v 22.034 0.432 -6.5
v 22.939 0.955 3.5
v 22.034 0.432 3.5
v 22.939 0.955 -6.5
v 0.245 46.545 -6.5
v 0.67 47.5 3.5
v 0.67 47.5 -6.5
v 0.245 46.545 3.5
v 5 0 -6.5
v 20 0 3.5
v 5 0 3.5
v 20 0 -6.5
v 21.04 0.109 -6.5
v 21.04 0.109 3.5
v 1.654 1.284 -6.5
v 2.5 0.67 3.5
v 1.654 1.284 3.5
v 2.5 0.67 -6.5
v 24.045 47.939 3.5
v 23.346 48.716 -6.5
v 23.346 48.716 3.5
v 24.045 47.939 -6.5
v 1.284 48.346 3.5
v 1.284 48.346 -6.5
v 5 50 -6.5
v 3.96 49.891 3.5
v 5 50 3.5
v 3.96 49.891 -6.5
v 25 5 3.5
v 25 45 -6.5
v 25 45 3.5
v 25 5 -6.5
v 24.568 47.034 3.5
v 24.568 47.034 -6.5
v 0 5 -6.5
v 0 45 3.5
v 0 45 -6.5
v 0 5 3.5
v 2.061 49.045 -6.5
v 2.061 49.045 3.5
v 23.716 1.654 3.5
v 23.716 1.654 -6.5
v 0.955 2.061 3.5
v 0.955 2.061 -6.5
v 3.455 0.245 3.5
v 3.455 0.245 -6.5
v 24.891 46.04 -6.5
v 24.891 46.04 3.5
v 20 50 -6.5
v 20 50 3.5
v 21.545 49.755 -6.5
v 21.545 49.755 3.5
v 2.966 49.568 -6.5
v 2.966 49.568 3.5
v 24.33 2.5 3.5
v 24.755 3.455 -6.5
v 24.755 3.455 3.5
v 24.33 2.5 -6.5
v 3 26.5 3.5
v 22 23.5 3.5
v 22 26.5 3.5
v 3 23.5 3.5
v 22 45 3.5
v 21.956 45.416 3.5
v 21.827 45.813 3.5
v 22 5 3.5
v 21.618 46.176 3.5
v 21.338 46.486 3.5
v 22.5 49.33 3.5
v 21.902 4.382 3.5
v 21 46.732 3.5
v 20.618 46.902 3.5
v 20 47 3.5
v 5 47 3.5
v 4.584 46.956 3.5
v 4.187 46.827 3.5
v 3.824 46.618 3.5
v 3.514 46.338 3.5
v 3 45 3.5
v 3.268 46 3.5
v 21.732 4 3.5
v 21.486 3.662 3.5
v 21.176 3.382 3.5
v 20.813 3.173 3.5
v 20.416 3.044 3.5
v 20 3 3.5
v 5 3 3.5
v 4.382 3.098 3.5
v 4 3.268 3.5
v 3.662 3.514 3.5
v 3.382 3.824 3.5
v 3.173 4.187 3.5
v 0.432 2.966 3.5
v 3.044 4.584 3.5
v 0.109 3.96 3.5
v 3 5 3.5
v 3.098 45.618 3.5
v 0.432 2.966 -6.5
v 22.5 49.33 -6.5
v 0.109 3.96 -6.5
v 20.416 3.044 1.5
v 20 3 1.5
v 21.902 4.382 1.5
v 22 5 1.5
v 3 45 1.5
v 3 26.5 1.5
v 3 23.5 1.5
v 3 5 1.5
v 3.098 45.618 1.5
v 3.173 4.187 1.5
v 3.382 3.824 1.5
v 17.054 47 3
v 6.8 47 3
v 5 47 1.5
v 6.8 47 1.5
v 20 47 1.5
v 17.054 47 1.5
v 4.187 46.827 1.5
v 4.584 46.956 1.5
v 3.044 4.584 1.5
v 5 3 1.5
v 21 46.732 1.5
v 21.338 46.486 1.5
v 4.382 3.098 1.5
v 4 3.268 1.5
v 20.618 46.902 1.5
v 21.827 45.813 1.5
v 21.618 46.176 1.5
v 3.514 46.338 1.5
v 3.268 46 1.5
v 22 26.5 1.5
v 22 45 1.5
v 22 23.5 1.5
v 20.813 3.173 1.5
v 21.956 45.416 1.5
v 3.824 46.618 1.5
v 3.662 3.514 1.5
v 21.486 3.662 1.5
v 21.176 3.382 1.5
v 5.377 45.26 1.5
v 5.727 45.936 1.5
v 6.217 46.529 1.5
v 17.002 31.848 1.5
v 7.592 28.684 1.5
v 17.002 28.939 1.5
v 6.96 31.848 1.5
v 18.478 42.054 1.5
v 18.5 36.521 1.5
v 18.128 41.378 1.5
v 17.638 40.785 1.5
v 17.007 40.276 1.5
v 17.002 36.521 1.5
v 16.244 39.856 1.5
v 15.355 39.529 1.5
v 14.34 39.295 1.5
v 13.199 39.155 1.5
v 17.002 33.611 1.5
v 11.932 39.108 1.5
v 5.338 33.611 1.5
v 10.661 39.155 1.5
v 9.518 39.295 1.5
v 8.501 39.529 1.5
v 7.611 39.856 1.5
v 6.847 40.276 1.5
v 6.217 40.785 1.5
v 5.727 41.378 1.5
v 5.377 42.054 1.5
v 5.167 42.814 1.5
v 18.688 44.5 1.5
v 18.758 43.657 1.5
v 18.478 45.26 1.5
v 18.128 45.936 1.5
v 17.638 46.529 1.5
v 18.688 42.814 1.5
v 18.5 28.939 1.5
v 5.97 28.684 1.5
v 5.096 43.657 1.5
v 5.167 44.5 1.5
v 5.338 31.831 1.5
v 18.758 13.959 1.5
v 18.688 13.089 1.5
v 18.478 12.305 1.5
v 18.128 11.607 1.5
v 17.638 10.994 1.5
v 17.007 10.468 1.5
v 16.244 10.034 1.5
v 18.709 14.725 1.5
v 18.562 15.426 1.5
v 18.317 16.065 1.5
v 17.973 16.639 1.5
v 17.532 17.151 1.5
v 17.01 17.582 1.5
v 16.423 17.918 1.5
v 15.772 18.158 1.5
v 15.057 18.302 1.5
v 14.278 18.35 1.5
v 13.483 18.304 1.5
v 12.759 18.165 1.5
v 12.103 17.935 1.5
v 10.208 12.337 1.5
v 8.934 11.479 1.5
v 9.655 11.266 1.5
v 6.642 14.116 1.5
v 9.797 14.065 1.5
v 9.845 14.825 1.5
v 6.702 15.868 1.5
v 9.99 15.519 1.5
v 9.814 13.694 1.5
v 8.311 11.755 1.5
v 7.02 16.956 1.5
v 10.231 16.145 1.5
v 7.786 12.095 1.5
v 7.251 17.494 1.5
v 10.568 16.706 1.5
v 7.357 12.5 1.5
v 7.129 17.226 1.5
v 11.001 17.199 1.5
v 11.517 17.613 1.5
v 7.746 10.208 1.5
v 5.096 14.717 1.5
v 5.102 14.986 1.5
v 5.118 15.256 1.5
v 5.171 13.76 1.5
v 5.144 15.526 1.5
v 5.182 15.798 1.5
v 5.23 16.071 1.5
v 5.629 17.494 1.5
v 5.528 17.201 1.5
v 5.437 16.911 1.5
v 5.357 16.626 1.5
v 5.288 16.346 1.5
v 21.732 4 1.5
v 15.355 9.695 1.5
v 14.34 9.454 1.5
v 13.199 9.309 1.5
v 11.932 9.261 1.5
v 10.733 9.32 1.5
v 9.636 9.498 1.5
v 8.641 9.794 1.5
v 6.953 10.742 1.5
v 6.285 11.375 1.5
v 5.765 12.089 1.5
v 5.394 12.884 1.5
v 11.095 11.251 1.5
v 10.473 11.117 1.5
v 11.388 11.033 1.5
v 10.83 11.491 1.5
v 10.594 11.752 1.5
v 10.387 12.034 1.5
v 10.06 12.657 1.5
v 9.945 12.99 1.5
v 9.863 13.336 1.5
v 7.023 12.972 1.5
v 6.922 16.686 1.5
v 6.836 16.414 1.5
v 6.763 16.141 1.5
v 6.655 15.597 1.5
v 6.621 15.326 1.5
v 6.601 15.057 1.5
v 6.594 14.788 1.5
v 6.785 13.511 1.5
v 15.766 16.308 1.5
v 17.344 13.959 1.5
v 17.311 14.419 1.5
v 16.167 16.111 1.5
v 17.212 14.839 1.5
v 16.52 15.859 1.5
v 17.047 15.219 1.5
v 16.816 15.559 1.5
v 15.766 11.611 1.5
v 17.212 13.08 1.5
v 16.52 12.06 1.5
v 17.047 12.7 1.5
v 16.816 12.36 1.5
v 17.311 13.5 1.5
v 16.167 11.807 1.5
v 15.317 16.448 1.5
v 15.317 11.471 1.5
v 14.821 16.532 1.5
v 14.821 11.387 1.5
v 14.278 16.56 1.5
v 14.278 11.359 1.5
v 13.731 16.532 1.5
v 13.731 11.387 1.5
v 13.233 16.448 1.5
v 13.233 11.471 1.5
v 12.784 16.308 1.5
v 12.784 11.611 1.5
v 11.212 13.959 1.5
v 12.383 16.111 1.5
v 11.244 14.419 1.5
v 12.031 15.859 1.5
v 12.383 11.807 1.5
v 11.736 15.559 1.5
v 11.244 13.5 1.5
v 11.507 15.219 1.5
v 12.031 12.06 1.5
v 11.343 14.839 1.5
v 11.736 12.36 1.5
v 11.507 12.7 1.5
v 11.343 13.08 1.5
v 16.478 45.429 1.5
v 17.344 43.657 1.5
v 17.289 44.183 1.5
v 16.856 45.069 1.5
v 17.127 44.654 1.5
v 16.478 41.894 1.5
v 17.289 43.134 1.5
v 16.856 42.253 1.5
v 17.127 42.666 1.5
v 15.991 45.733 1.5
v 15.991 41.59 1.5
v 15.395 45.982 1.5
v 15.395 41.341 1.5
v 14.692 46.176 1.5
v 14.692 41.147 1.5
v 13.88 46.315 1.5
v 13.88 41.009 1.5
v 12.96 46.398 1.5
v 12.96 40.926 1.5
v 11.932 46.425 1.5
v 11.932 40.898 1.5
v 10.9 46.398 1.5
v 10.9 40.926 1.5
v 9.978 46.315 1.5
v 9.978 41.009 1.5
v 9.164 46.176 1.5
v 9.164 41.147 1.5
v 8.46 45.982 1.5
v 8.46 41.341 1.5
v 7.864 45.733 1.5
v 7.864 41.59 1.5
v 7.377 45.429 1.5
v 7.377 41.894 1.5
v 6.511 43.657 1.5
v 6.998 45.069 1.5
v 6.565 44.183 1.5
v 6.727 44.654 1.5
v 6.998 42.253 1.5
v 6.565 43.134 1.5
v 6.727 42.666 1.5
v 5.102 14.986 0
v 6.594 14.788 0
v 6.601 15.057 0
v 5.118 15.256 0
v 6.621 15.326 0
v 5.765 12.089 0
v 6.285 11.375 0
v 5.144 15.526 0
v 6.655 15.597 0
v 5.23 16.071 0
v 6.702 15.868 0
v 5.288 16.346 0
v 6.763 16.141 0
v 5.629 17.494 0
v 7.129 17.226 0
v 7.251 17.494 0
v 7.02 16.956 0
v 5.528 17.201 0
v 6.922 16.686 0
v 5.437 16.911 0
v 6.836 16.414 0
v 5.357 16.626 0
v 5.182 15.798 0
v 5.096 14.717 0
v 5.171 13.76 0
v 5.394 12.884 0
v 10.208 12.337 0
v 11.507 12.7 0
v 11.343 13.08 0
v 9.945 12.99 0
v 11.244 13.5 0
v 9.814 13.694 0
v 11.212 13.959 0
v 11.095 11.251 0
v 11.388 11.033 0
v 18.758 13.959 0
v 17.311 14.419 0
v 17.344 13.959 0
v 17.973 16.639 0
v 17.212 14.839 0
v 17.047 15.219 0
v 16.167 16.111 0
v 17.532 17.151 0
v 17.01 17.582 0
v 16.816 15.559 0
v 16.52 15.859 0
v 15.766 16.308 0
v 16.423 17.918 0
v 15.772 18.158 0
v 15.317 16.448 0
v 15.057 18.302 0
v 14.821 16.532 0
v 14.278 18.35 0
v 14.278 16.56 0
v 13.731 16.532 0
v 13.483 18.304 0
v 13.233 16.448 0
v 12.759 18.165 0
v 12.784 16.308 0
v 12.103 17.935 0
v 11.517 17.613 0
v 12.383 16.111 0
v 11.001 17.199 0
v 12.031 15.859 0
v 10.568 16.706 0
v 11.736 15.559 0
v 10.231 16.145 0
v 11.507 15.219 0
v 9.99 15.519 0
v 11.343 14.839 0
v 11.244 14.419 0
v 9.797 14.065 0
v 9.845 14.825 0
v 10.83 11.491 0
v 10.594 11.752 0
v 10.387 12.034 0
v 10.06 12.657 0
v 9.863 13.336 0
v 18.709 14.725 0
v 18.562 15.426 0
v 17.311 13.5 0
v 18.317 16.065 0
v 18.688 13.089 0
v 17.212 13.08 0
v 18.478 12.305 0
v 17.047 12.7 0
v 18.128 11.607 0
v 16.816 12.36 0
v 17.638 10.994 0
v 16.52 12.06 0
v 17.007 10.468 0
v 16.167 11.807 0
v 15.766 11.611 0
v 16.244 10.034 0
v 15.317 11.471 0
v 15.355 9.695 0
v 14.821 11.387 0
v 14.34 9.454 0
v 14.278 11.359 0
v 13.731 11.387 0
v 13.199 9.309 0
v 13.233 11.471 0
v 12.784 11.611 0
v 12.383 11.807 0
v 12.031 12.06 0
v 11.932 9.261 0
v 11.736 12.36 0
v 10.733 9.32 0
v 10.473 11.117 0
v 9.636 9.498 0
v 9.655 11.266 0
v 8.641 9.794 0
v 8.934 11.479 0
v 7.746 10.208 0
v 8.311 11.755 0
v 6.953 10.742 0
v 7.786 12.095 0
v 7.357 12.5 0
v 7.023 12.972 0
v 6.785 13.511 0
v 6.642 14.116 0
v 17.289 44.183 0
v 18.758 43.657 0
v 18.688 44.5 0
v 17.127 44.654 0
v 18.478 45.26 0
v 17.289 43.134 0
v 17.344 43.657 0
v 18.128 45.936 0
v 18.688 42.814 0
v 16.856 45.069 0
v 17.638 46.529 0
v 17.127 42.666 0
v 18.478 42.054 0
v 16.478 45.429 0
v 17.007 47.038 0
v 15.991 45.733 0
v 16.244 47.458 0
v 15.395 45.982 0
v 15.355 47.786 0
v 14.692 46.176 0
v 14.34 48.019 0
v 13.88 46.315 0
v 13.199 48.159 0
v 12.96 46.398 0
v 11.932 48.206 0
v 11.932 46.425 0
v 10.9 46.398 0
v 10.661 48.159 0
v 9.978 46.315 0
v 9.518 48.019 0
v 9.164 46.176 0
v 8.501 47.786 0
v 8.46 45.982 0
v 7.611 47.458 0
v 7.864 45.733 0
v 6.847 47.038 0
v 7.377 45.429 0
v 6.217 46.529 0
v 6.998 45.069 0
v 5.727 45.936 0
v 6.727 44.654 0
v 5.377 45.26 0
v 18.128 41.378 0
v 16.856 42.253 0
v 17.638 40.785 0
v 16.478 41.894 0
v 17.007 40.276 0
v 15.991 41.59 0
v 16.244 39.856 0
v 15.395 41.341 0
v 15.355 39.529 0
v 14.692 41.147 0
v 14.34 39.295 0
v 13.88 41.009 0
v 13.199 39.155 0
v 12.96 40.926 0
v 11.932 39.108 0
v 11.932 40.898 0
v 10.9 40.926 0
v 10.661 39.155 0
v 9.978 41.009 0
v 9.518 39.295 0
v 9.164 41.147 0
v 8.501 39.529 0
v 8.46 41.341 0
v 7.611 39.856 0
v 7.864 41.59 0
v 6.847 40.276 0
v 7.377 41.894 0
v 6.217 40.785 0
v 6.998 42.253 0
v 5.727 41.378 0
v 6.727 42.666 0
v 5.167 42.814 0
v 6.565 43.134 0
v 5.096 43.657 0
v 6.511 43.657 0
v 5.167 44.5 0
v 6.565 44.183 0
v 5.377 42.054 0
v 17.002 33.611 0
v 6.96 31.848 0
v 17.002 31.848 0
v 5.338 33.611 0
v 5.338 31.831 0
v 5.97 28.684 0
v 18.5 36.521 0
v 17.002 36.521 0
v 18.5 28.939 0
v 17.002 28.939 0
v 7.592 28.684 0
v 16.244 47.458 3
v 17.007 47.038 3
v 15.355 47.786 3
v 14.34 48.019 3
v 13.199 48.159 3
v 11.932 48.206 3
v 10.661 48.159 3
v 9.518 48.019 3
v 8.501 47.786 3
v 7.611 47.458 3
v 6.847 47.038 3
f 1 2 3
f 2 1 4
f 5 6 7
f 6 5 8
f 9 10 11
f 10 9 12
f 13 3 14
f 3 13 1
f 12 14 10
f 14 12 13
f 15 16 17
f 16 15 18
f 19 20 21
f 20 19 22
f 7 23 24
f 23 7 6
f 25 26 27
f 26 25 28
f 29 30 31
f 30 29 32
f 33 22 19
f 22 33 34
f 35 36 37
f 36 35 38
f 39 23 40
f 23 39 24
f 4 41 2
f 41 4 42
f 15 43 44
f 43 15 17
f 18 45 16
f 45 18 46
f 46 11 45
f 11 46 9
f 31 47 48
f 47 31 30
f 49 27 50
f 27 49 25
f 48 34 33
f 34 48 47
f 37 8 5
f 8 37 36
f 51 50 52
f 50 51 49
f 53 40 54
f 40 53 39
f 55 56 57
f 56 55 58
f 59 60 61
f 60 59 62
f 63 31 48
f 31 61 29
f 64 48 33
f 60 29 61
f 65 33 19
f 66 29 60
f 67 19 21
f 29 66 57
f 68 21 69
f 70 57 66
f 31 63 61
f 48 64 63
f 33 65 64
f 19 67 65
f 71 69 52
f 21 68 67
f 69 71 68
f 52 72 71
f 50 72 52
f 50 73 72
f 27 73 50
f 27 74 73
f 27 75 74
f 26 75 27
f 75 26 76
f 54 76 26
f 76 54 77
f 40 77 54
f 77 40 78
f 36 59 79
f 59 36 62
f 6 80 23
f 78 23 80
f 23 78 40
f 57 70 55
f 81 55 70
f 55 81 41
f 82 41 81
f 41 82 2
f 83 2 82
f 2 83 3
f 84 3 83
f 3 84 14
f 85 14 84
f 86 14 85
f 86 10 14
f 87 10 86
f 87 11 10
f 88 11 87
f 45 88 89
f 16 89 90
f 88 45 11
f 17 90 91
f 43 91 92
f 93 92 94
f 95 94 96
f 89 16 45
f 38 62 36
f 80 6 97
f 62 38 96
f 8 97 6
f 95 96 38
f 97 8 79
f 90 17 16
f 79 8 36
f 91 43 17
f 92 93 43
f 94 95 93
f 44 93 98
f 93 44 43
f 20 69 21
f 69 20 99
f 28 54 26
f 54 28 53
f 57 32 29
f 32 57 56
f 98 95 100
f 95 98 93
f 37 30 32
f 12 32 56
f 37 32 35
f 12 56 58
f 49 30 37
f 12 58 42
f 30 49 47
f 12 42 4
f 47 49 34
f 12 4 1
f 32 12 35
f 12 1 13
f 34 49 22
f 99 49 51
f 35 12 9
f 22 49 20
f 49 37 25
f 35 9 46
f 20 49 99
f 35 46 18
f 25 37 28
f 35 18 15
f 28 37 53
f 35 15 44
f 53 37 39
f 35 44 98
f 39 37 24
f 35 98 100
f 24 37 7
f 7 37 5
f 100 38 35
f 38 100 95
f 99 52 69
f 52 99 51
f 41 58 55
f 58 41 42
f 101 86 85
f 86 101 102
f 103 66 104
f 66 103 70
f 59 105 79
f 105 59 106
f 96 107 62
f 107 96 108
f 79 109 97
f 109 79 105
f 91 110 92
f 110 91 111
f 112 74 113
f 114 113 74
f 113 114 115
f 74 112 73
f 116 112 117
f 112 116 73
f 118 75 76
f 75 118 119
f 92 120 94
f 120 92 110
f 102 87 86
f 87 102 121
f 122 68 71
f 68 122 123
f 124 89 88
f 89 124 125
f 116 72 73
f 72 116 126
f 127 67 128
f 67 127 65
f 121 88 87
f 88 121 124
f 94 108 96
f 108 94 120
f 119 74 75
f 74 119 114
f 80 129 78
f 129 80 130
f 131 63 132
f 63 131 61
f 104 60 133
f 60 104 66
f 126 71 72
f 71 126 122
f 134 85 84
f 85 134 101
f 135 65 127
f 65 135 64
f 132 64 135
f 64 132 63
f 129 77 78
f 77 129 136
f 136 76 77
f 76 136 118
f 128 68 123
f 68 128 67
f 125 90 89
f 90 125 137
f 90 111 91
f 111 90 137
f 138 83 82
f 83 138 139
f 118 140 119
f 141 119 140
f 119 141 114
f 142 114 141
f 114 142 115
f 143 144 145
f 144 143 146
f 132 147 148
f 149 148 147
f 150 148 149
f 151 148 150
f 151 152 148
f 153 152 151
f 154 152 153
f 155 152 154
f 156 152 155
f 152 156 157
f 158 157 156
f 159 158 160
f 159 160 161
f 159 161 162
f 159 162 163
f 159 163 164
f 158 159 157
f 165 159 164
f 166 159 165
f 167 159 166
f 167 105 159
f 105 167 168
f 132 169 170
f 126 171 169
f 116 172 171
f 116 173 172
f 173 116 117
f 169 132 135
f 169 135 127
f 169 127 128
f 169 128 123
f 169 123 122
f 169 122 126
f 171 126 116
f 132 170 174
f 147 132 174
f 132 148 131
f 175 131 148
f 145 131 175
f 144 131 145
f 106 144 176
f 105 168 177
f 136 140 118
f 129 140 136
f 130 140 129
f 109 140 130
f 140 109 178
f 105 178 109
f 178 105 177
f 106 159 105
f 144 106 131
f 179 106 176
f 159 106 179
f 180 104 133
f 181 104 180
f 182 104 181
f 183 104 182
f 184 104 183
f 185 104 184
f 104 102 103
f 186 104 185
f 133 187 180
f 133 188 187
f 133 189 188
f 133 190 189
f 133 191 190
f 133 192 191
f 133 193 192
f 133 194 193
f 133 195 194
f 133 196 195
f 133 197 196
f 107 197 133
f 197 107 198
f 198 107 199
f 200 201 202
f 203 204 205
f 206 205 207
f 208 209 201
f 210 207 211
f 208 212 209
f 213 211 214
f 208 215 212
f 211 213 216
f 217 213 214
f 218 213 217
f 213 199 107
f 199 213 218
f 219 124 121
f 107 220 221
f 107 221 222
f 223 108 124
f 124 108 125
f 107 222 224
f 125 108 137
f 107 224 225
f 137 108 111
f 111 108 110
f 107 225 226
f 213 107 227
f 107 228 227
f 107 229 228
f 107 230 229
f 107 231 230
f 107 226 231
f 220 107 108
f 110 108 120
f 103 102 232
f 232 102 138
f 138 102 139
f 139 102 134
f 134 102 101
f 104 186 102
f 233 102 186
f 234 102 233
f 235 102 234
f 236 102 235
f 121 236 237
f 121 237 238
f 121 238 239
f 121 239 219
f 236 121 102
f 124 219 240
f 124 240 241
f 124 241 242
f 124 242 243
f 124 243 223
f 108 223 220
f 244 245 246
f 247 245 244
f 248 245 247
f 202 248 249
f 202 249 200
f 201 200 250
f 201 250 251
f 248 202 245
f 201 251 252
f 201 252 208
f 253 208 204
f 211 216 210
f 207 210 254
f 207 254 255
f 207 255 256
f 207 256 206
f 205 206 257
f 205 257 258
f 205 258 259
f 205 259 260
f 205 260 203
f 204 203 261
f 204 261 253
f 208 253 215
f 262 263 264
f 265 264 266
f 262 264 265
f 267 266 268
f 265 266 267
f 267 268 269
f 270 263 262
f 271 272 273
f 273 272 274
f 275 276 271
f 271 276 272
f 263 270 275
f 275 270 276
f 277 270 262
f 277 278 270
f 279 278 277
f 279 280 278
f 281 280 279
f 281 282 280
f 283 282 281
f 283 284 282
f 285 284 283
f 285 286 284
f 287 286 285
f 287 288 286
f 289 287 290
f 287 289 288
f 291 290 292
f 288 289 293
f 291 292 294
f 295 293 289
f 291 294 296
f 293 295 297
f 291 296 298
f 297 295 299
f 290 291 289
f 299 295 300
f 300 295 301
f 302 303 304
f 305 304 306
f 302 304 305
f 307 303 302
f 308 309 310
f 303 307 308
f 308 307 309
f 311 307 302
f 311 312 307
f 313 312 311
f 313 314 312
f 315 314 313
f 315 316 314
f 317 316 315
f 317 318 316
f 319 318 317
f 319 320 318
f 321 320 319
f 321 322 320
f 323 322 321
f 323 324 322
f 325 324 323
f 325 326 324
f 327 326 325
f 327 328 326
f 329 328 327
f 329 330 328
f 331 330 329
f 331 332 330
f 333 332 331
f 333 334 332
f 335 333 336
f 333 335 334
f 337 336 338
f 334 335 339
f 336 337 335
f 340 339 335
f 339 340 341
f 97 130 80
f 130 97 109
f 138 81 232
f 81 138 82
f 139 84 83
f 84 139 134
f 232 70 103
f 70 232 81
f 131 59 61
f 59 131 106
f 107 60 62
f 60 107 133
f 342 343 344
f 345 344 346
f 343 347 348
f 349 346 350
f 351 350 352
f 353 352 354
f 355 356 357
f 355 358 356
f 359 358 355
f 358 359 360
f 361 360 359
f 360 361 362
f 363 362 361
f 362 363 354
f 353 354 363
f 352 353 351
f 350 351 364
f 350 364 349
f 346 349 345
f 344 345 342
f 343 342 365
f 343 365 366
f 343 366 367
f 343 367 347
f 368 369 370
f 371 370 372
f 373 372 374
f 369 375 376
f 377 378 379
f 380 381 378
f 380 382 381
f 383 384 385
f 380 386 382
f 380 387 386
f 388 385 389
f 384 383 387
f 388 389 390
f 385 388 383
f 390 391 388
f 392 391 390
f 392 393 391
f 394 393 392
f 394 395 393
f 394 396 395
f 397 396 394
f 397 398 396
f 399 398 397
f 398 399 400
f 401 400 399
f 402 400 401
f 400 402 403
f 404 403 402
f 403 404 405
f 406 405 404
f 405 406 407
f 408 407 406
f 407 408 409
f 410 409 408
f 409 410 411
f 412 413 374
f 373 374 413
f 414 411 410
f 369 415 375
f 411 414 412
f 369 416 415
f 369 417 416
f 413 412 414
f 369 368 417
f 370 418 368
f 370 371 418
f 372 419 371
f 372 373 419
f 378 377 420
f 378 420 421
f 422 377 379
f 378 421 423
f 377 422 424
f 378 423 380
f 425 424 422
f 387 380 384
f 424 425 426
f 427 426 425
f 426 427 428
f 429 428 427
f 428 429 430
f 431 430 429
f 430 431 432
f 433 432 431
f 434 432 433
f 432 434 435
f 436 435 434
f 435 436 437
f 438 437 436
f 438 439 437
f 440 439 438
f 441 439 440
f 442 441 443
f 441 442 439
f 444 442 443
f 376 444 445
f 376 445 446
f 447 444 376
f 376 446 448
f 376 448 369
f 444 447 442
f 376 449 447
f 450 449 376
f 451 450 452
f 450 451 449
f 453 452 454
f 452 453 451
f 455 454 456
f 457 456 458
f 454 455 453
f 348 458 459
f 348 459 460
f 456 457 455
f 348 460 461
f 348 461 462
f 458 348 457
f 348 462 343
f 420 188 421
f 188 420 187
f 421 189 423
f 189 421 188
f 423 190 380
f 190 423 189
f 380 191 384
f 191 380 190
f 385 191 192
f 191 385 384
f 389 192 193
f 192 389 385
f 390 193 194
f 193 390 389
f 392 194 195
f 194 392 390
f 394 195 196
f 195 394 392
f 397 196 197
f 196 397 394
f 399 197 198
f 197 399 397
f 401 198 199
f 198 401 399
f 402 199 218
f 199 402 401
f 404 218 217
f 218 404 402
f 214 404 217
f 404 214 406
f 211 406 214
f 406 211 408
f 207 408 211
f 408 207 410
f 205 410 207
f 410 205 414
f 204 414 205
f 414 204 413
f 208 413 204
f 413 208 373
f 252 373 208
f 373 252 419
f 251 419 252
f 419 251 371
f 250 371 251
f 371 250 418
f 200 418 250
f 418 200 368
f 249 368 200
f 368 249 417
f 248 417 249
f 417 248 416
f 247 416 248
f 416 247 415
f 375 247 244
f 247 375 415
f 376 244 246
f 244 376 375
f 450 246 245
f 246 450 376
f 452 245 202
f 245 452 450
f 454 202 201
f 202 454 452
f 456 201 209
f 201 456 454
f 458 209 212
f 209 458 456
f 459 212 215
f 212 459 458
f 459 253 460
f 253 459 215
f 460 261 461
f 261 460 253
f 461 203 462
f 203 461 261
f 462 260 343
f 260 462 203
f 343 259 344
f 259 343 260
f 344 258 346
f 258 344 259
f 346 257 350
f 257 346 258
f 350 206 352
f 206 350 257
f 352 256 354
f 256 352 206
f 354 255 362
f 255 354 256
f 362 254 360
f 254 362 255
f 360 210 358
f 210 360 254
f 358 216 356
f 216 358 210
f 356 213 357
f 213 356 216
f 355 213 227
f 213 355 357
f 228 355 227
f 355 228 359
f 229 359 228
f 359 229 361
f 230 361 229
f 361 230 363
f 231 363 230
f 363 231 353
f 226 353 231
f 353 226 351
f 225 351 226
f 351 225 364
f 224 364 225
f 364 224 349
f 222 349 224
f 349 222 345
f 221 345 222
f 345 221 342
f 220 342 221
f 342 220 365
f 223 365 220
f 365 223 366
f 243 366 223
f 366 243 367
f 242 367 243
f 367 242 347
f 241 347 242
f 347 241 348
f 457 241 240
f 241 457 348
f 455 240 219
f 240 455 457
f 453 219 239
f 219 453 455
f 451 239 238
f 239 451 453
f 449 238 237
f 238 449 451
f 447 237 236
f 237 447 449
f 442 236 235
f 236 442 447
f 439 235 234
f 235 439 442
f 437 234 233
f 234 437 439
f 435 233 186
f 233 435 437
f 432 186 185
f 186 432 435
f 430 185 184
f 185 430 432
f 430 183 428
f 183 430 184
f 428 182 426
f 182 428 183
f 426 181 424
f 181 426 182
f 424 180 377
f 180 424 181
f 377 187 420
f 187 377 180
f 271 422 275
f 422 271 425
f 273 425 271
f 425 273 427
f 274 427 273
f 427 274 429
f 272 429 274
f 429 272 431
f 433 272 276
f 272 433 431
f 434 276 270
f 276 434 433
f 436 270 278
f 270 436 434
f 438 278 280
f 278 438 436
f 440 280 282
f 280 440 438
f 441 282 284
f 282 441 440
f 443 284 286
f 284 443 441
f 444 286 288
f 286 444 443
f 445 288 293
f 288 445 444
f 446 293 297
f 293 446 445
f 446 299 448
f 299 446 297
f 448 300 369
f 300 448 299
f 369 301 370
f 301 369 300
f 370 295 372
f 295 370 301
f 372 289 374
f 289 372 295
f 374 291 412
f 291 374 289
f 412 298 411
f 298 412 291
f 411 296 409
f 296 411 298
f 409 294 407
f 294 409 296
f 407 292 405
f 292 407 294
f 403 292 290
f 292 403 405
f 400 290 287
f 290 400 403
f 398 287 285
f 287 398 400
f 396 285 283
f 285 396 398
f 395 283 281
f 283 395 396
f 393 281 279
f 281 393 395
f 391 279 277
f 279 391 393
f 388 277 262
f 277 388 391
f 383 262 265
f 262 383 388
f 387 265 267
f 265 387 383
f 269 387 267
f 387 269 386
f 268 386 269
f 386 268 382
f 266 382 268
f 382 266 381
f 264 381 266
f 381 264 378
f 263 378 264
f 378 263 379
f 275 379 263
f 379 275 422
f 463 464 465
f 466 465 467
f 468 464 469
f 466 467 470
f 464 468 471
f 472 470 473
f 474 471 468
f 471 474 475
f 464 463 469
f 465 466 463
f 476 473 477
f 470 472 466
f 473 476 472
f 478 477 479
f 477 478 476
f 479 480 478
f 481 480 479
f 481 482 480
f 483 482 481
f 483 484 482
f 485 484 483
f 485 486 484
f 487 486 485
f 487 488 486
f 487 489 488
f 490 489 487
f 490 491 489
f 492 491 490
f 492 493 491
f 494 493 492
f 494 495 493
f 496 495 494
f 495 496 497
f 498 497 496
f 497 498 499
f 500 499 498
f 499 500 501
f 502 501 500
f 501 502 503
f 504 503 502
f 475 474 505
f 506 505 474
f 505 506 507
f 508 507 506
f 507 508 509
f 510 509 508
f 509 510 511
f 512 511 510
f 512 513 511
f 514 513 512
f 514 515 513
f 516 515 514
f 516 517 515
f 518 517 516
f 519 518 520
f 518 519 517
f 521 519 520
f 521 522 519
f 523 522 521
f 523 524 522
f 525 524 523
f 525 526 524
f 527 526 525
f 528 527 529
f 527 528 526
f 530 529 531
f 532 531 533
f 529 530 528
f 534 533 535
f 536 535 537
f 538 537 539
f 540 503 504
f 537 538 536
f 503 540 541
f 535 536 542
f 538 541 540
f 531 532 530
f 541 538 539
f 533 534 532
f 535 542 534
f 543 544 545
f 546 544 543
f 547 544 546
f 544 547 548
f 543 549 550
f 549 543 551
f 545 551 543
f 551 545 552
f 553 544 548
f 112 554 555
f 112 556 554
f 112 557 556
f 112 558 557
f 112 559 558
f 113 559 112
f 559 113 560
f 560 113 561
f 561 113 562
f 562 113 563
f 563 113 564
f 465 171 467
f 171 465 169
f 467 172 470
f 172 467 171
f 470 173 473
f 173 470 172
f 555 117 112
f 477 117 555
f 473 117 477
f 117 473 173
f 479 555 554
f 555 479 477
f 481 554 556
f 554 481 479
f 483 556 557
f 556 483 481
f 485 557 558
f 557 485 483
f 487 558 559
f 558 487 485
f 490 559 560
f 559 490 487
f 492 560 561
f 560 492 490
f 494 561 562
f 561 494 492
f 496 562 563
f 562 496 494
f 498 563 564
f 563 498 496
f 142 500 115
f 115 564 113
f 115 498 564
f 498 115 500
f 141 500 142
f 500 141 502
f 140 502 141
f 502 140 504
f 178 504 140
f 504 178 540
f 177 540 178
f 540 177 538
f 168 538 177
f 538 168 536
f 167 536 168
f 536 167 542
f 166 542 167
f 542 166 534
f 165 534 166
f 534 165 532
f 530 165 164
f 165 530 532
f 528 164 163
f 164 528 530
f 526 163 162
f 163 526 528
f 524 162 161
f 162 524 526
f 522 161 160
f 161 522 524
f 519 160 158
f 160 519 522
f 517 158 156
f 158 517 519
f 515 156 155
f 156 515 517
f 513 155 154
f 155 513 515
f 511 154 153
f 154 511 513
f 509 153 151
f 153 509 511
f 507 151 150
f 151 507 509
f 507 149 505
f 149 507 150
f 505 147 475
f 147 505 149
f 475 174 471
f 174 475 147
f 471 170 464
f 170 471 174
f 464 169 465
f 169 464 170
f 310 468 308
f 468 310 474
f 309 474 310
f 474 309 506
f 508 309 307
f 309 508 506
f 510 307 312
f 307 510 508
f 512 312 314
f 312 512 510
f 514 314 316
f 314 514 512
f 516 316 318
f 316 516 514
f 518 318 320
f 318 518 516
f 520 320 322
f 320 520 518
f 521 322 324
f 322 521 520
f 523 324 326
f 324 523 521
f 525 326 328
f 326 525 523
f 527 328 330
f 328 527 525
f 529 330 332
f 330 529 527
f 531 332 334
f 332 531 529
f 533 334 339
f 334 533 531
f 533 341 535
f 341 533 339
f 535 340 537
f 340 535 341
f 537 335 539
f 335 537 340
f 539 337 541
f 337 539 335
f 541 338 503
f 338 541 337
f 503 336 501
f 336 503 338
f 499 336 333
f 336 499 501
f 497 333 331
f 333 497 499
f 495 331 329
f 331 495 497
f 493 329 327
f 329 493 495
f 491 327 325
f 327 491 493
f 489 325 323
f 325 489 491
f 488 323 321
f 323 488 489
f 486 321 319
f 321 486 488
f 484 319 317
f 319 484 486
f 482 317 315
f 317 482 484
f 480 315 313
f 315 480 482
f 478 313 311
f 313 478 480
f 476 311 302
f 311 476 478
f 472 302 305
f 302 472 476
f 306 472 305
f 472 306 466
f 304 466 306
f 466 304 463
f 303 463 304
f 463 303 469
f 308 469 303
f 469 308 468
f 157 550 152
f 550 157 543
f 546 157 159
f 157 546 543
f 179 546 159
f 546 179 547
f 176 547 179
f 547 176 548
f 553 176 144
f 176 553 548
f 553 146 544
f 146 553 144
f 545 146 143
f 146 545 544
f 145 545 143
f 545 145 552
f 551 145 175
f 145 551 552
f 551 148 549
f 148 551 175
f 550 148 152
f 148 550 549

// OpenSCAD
number_for_first_domino_space = "six"; //[one, two, three, four, five, six, seven, eight, nine, ten, eleven, twelve, blank]
number_for_second_domino_space = "ten"; //[one, two, three, four, five, six, seven, eight, nine, ten, eleven, twelve, blank]

What_font = "Standard"; //[Standard, Fjalla One, Roboto, Ubuntu, Lobster, Anton, Exo Bold, Patua One]

echo(What_font);

// Hidden parameter
module stopCustomizer(){}
$fn=35;


// Declare what size to use for each number
numSize =       (What_font == "Standard") ? 13 : 
                (What_font == "Fjalla One") ? 13.5 :
                (What_font == "Roboto") ? 13 :
                (What_font == "Ubuntu") ? 13 :
                (What_font == "Lobster") ? 14 :
                (What_font == "Anton") ? 14 :
                (What_font == "Exo Bold" ? 14 : 14);
echo(numSize);

// Declare translate X to use for each number
translateX =    (What_font == "Standard") ? 18.5 : 
                (What_font == "Fjalla One") ? 20.5 :
                (What_font == "Roboto") ? 18.6 :
                (What_font == "Ubuntu") ? 18 :
                (What_font == "Lobster") ? 19.7 :
                (What_font == "Anton") ? 19.7 :
                (What_font == "Exo Bold" ? 19 : 19);

// Declare translate Y to use for each font on single digit numbers first space
singleTranslateFirstY = (What_font == "Standard") ? 8 : 
                (What_font == "Fjalla One") ? 9.5 :
                (What_font == "Roboto") ? 8 :
                (What_font == "Ubuntu") ? 8 :
                (What_font == "Lobster") ? 8 :
                (What_font == "Anton") ? 9 :
                (What_font == "Exo Bold" ? 7.7 : 10.3);

// Declare translate Y to use for each font on single digit numbers second space
singleTranslateSecondY = (What_font == "Standard") ? 31.5 : 
                (What_font == "Fjalla One") ? 32.5 :
                (What_font == "Roboto") ? 32 :
                (What_font == "Ubuntu") ? 32 :
                (What_font == "Lobster") ? 32 :
                (What_font == "Anton") ? 32 :
                (What_font == "Exo Bold" ? 31.8 : 33.4);

// Declare translate Y to use for each font on double digit numbers first space
doubleTranslateFirstY = (What_font == "Standard") ? 3 : 
                (What_font == "Fjalla One") ? 5 :
                (What_font == "Roboto") ? 3 :
                (What_font == "Ubuntu") ? 3 :
                (What_font == "Lobster") ? 4.3 :
                (What_font == "Anton") ? 4.8 :
                (What_font == "Exo Bold" ? 2 : 5);

// Declare translate Y to use for each font on double digit numbers second space
doubleTranslateSecondY = (What_font == "Standard") ? 26.7 : 
                (What_font == "Fjalla One") ? 28.5 :
                (What_font == "Roboto") ? 26 :
                (What_font == "Ubuntu") ? 26 :
                (What_font == "Lobster") ? 28 :
                (What_font == "Anton") ? 28.5 :
                (What_font == "Exo Bold" ? 25.8 : 28);

// Declare translate Y to use for first space for number 11
elevenTranslateFirstY = (What_font == "Standard") ? 3.7 : 
                (What_font == "Fjalla One") ? 5.2 :
                (What_font == "Roboto") ? 4 :
                (What_font == "Ubuntu") ? 3.8 :
                (What_font == "Lobster") ? 7 :
                (What_font == "Anton") ? 6.5 :
                (What_font == "Exo Bold" ? 3.3 : 7);

// Declare translate Y to use for second space for number 11
elevenTranslateY = (What_font == "Standard") ? 27.4 : 
                (What_font == "Fjalla One") ? 28.7 :
                (What_font == "Roboto") ? 27 :
                (What_font == "Ubuntu") ? 26.8 :
                (What_font == "Lobster") ? 30 :
                (What_font == "Anton") ? 29.5 :
                (What_font == "Exo Bold" ? 26.4 : 30.1);

/* Number Modules*/

module one()
{
    linear_extrude(height = 3)
    rotate([0,0,90])
    text("1", size = numSize, font = What_font);
}


module two()
{
    linear_extrude(height = 3)
    rotate([0,0,90])
    text("2", size = numSize, font = What_font);
}

module three()
{
    linear_extrude(height = 3)
    rotate([0,0,90])
    text("3", size = numSize, font = What_font);
}

module four()
{
    linear_extrude(height = 3)
    rotate([0,0,90])
    text("4", size = numSize, font = What_font);
}

module five()
{
    linear_extrude(height = 3)
    rotate([0,0,90])
    text("5", size = numSize, font = What_font);
}

module six()
{
    linear_extrude(height = 3)
    rotate([0,0,90])
    text("6", size = numSize, font = What_font);
}

module seven()
{
    linear_extrude(height = 3)
    rotate([0,0,90])
    text("7", size = numSize, font = What_font);
}

module eight()
{
    linear_extrude(height = 3)
    rotate([0,0,90])
    text("8", size = numSize, font = What_font);
}

module nine()
{
    linear_extrude(height = 3)
    rotate([0,0,90])
    text("9", size = numSize, font = What_font);
}

module ten()
{
    linear_extrude(height = 3)
    rotate([0,0,90])
    text("10", size = numSize, font = What_font);
}

module eleven()
{
    linear_extrude(height = 3)
    rotate([0,0,90])
    text("11", size = numSize, font = What_font);
}

module twelve()
{
    linear_extrude(height = 3)
    rotate([0,0,90])
    text("12", size = numSize, font = What_font);
}


// Main DominoBody
module dominoBody()
{
    linear_extrude(height=10)offset(r=5, $fn=30)
    square([15, 40]);
}

// Domino top cutout
module dominoCutout()
{
    linear_extrude(height=10-7.9)offset(r=5-3, $fn=30)
    square([15, 40]);
}

// Top seperator bar
module topBar()
{
    cube([25, 3, 10]);
}

// Complete Blank Domino
module blankDomino()
{
    difference()
    {
        translate([5,5,-6.5])
        dominoBody();
        translate([5,5,1.5])
        dominoCutout();
    }
    translate([0, 23.5, -6.5])
    topBar();
}


// Assignments for the first Spaces


// First domino space blank
module firstSpaceBlank()
{
        blankDomino();
}

// First domino space one

module firstSpaceOne()
{
    difference()
    {
        blankDomino();
        translate ([translateX, singleTranslateFirstY]) one();
    }
}

// First domino space two
module firstSpaceTwo()
{
    difference()
    {
        blankDomino();
        translate ([translateX, singleTranslateFirstY]) two();
    }
}

// First domino space three
module firstSpaceThree()
{
    difference()
    {
        blankDomino();
        translate ([translateX, singleTranslateFirstY]) three();
    }
}

// First domino space four
module firstSpaceFour()
{
    difference()
    {
        blankDomino();
        translate ([translateX, singleTranslateFirstY]) four();
    }
}

// First domino space five
module firstSpaceFive()
{
    difference()
    {
        blankDomino();
        translate ([translateX, singleTranslateFirstY]) five();
    }
}

// First domino space six
module firstSpaceSix()
{
    difference()
    {
        blankDomino();
        translate ([translateX, singleTranslateFirstY]) six();
    }
}

// First domino space seven
module firstSpaceSeven()
{
    difference()
    {
        blankDomino();
        translate ([translateX, singleTranslateFirstY]) seven();
    }
}

// First domino space eight
module firstSpaceEight()
{
    difference()
    {
        blankDomino();
        translate ([translateX, singleTranslateFirstY]) eight();
    }
}

// First domino space nine
module firstSpaceNine()
{
    difference()
    {
        blankDomino();
        translate ([translateX, singleTranslateFirstY]) nine();
    }
}

// First domino space ten
module firstSpaceTen()
{
    difference()
    {
        blankDomino();
        translate ([translateX, doubleTranslateFirstY]) ten();
    }
}

// First domino space eleven
module firstSpaceEleven()
{
    difference()
    {
        blankDomino();
        translate ([translateX, elevenTranslateFirstY]) eleven();
    }
}

// First domino space twelve
module firstSpaceTwelve()
{
    difference()
    {
        blankDomino();
        translate ([translateX, doubleTranslateFirstY]) twelve();
    }
}


// SPACE ONE ASSIGNMENTS

if (number_for_first_domino_space=="one")
{
    if (number_for_second_domino_space=="one")
    {
        difference()
        {
            firstSpaceOne();
            translate ([translateX, singleTranslateSecondY]) one();
        }
    }
    else
    if (number_for_second_domino_space=="two")
    {
        difference()
        {
            firstSpaceOne();
            translate ([translateX, singleTranslateSecondY]) two();
        }
    }
    else
    if (number_for_second_domino_space=="three")
    {    
        difference()
        {
            firstSpaceOne();
            translate ([translateX, singleTranslateSecondY]) three();
        }
    }
    else
    if (number_for_second_domino_space=="four")
    {
        difference()
        {
            firstSpaceOne();
            translate ([translateX, singleTranslateSecondY]) four();
        }
    }
    else        
    if (number_for_second_domino_space=="five")
    {
        difference()
        {
            firstSpaceOne();
            translate ([translateX, singleTranslateSecondY]) five();
        }
    }
    else
    if (number_for_second_domino_space=="six")
    {
        difference()
        {
            firstSpaceOne();
            translate ([translateX, singleTranslateSecondY]) six();
        }
    }
    else
    if (number_for_second_domino_space=="seven")
    {
        difference()
        {
            firstSpaceOne();
            translate ([translateX, singleTranslateSecondY]) seven();
        }
    }
    else
    if (number_for_second_domino_space=="eight")
    {
        difference()
        {
            firstSpaceOne();
            translate ([translateX, singleTranslateSecondY]) eight();
        }
    }
    else
    if (number_for_second_domino_space=="nine")
    {
        difference()
        {
            firstSpaceOne();
            translate ([translateX, singleTranslateSecondY]) nine();
        }
    }
    else
    if (number_for_second_domino_space=="ten")
    {
        difference()
        {
            firstSpaceOne();
            translate ([translateX, doubleTranslateSecondY]) ten();
        }
    }
    else
    if (number_for_second_domino_space=="eleven")
    {
        difference()
        {
            firstSpaceOne();
            translate ([translateX, elevenTranslateY]) eleven();
        }
    }
    else
    if (number_for_second_domino_space=="twelve")
    {
        difference()
        {
            firstSpaceOne();
            translate ([translateX, doubleTranslateSecondY]) twelve();
        }
    }
    else
    if (number_for_second_domino_space=="blank")
    {
        difference()
        {
            firstSpaceOne();
            translate ([translateX, doubleTranslateSecondY]) blank();
        }
    }
}
else{
if (number_for_first_domino_space=="two")
{
    if (number_for_second_domino_space=="one")
    {
        difference()
        {
            firstSpaceTwo();
            translate ([translateX, singleTranslateSecondY]) one();
        }
    }
    else
    if (number_for_second_domino_space=="two")
    {
        difference()
        {
            firstSpaceTwo();
            translate ([translateX, singleTranslateSecondY]) two();
        }
    }
    else
    if (number_for_second_domino_space=="three")
    {
        difference()
        {
            firstSpaceTwo();
            translate ([translateX, singleTranslateSecondY]) three();
        }
    }
    else
    if (number_for_second_domino_space=="four")
    {
        difference()
        {
            firstSpaceTwo();
            translate ([translateX, singleTranslateSecondY]) four();
        }
    }
    else
    if (number_for_second_domino_space=="five")
    {
        difference()
        {
            firstSpaceTwo();
            translate ([translateX, singleTranslateSecondY]) five();
        }
    }
    else
    if (number_for_second_domino_space=="six")
    {
        difference()
        {
            firstSpaceTwo();
            translate ([translateX, singleTranslateSecondY]) six();
        }
    }
    else
    if (number_for_second_domino_space=="seven")
    {
        difference()
        {
            firstSpaceTwo();
            translate ([translateX, singleTranslateSecondY]) seven();
        }
    }
    else
    if (number_for_second_domino_space=="eight")
    {
        difference()
        {
            firstSpaceTwo();
            translate ([translateX, singleTranslateSecondY]) eight();
        }
    }
    else
    if (number_for_second_domino_space=="nine")
    {
        difference()
        {
            firstSpaceTwo();
            translate ([translateX, singleTranslateSecondY]) nine();
        }
    }
    else
    if (number_for_second_domino_space=="ten")
    {
        difference()
        {
            firstSpaceTwo();
            translate ([translateX, doubleTranslateSecondY]) ten();
        }
    }
    else
    if (number_for_second_domino_space=="eleven")
    {
        difference()
        {
            firstSpaceTwo();
            translate ([translateX, elevenTranslateY]) eleven();
        }
    }
    else
    if (number_for_second_domino_space=="twelve")
    {
        difference()
        {
            firstSpaceTwo();
            translate ([translateX, doubleTranslateSecondY]) twelve();
        }
    }
    else
    if (number_for_second_domino_space=="blank")
    {
        difference()
        {
            firstSpaceTwo();
            translate ([translateX, doubleTranslateSecondY]) blank();
        }
    }
}
else{
if (number_for_first_domino_space=="three")
{
    if (number_for_second_domino_space=="one")
    {
        difference()
        {
            firstSpaceThree();
            translate ([translateX, singleTranslateSecondY]) one();
        }
    }
    else
    if (number_for_second_domino_space=="two")
    {
        difference()
        {
            firstSpaceThree();
            translate ([translateX, singleTranslateSecondY]) two();
        }
    }
    if (number_for_second_domino_space=="three")
    {
        difference()
        {
            firstSpaceThree();
            translate ([translateX, singleTranslateSecondY]) three();
        }
    }
    else
    if (number_for_second_domino_space=="four")
    {
        difference()
        {
            firstSpaceThree();
            translate ([translateX, singleTranslateSecondY]) four();
        }
    }
    else
    if (number_for_second_domino_space=="five")
    {
        difference()
        {
            firstSpaceThree();
            translate ([translateX, singleTranslateSecondY]) five();
        }
    }
    else
    if (number_for_second_domino_space=="six")
    {
        difference()
        {
            firstSpaceThree();
            translate ([translateX, singleTranslateSecondY]) six();
        }
    }
    else
    if (number_for_second_domino_space=="seven")
    {
        difference()
        {
            firstSpaceThree();
            translate ([translateX, singleTranslateSecondY]) seven();
        }
    }
    else
    if (number_for_second_domino_space=="eight")
    {
        difference()
        {
            firstSpaceThree();
            translate ([translateX, singleTranslateSecondY]) eight();
        }
    }
    else
    if (number_for_second_domino_space=="nine")
    {
        difference()
        {
            firstSpaceThree();
            translate ([translateX, singleTranslateSecondY]) nine();
        }
    }
    else
    if (number_for_second_domino_space=="ten")
    {
        difference()
        {
            firstSpaceThree();
            translate ([translateX, doubleTranslateSecondY]) ten();
        }
    }
    else
    if (number_for_second_domino_space=="eleven")
    {
        difference()
        {
            firstSpaceThree();
            translate ([translateX, elevenTranslateY]) eleven();
        }
    }
    else
    if (number_for_second_domino_space=="twelve")
    {
        difference()
        {
            firstSpaceThree();
            translate ([translateX, doubleTranslateSecondY]) twelve();
        }
    }
    else
    if (number_for_second_domino_space=="blank")
    {
        difference()
        {
            firstSpaceThree();
            translate ([translateX, doubleTranslateSecondY]) blank();
        }
    }
}
else{
if (number_for_first_domino_space=="four")
{
    if (number_for_second_domino_space=="one")
    {
        difference()
        {
            firstSpaceFour();
            translate ([translateX, singleTranslateSecondY]) one();
        }
    }
    else
    if (number_for_second_domino_space=="two")
    {
        difference()
        {
            firstSpaceFour();
            translate ([translateX, singleTranslateSecondY]) two();
        }
    }
    else
    if (number_for_second_domino_space=="three")
    {
        difference()
        {
            firstSpaceFour();
            translate ([translateX, singleTranslateSecondY]) three();
        }
    }
    else
    if (number_for_second_domino_space=="four")
    {
        difference()
        {
            firstSpaceFour();
            translate ([translateX, singleTranslateSecondY]) four();
        }
    }
    else
    if (number_for_second_domino_space=="five")
    {
        difference()
        {
            firstSpaceFour();
            translate ([translateX, singleTranslateSecondY]) five();
        }
    }
    else
    if (number_for_second_domino_space=="six")
    {
        difference()
        {
            firstSpaceFour();
            translate ([translateX, singleTranslateSecondY]) six();
        }
    }
    else
    if (number_for_second_domino_space=="seven")
    {
        difference()
        {
            firstSpaceFour();
            translate ([translateX, singleTranslateSecondY]) seven();
        }
    }
    else
    if (number_for_second_domino_space=="eight")
    {
        difference()
        {
            firstSpaceFour();
            translate ([translateX, singleTranslateSecondY]) eight();
        }
    }
    else
    if (number_for_second_domino_space=="nine")
    {
        difference()
        {
            firstSpaceFour();
            translate ([translateX, singleTranslateSecondY]) nine();
        }
    }
    else
    if (number_for_second_domino_space=="ten")
    {
        difference()
        {
            firstSpaceFour();
            translate ([translateX, doubleTranslateSecondY]) ten();
        }
    }
    else
    if (number_for_second_domino_space=="eleven")
    {
        difference()
        {
            firstSpaceFour();
            translate ([translateX, elevenTranslateY]) eleven();
        }
    }
    else
    if (number_for_second_domino_space=="twelve")
    {
        difference()
        {
            firstSpaceFour();
            translate ([translateX, doubleTranslateSecondY]) twelve();
        }
    }
    else
    if (number_for_second_domino_space=="blank")
    {
        difference()
        {
            firstSpaceFour();
            translate ([translateX, doubleTranslateSecondY]) blank();
        }
    }
}
else{
if (number_for_first_domino_space=="five")
{
    if (number_for_second_domino_space=="one")
    {
        difference()
        {
            firstSpaceFive();
            translate ([translateX, singleTranslateSecondY]) one();
        }
    }
    else
    if (number_for_second_domino_space=="two")
    {
        difference()
        {
            firstSpaceFive();
            translate ([translateX, singleTranslateSecondY]) two();
        }
    }
    else
    if (number_for_second_domino_space=="three")
    {
        difference()
        {
            firstSpaceFive();
            translate ([translateX, singleTranslateSecondY]) three();
        }
    }
    else
    if (number_for_second_domino_space=="four")
    {
        difference()
        {
            firstSpaceFive();
            translate ([translateX, singleTranslateSecondY]) four();
        }
    }
    else
    if (number_for_second_domino_space=="five")
    {
        difference()
        {
            firstSpaceFive();
            translate ([translateX, singleTranslateSecondY]) five();
        }
    }
    else
    if (number_for_second_domino_space=="six")
    {
        difference()
        {
            firstSpaceFive();
            translate ([translateX, singleTranslateSecondY]) six();
        }
    }
    else
    if (number_for_second_domino_space=="seven")
    {
        difference()
        {
            firstSpaceFive();
            translate ([translateX, singleTranslateSecondY]) seven();
        }
    }
    else
    if (number_for_second_domino_space=="eight")
    {
        difference()
        {
            firstSpaceFive();
            translate ([translateX, singleTranslateSecondY]) eight();
        }
    }
    else
    if (number_for_second_domino_space=="nine")
    {
        difference()
        {
            firstSpaceFive();
            translate ([translateX, singleTranslateSecondY]) nine();
        }
    }
    else
    if (number_for_second_domino_space=="ten")
    {
        difference()
        {
            firstSpaceFive();
            translate ([translateX, doubleTranslateSecondY]) ten();
        }
    }
    else
    if (number_for_second_domino_space=="eleven")
    {
        difference()
        {
            firstSpaceFive();
            translate ([translateX, elevenTranslateY]) eleven();
        }
    }
    else
    if (number_for_second_domino_space=="twelve")
    {
        difference()
        {
            firstSpaceFive();
            translate ([translateX, doubleTranslateSecondY]) twelve();
        }
    }
    else
    if (number_for_second_domino_space=="blank")
    {
        difference()
        {
            firstSpaceFive();
            translate ([translateX, doubleTranslateSecondY]) blank();
        }
    }
}
else{
if (number_for_first_domino_space=="six")
{
    if (number_for_second_domino_space=="one")
    {
        difference()
        {
            firstSpaceSix();
            translate ([translateX, singleTranslateSecondY]) one();
        }
    }
    else
    if (number_for_second_domino_space=="two")
    {
        difference()
        {
            firstSpaceSix();
            translate ([translateX, singleTranslateSecondY]) two();
        }
    }
    else
    if (number_for_second_domino_space=="three")
    {
        difference()
        {
            firstSpaceSix();
            translate ([translateX, singleTranslateSecondY]) three();
        }
    }
    else
    if (number_for_second_domino_space=="four")
    {
        difference()
        {
            firstSpaceSix();
            translate ([translateX, singleTranslateSecondY]) four();
        }
    }
    else
    if (number_for_second_domino_space=="five")
    {
        difference()
        {
            firstSpaceSix();
            translate ([translateX, singleTranslateSecondY]) five();
        }
    }
    else
    if (number_for_second_domino_space=="six")
    {
        difference()
        {
            firstSpaceSix();
            translate ([translateX, singleTranslateSecondY]) six();
        }
    }
    else
    if (number_for_second_domino_space=="seven")
    {
        difference()
        {
            firstSpaceSix();
            translate ([translateX, singleTranslateSecondY]) seven();
        }
    }
    else
    if (number_for_second_domino_space=="eight")
    {
        difference()
        {
            firstSpaceSix();
            translate ([translateX, singleTranslateSecondY]) eight();
        }
    }
    else
    if (number_for_second_domino_space=="nine")
    {
        difference()
        {
            firstSpaceSix();
            translate ([translateX, singleTranslateSecondY]) nine();
        }
    }
    else
    if (number_for_second_domino_space=="ten")
    {
        difference()
        {
            firstSpaceSix();
            translate ([translateX, doubleTranslateSecondY]) ten();
        }
    }
    else
    if (number_for_second_domino_space=="eleven")
    {
        difference()
        {
            firstSpaceSix();
            translate ([translateX, elevenTranslateY]) eleven();
        }
    }
    else
    if (number_for_second_domino_space=="twelve")
    {
        difference()
        {
            firstSpaceSix();
            translate ([translateX, doubleTranslateSecondY]) twelve();
        }
    }
    else
    if (number_for_second_domino_space=="blank")
    {
        difference()
        {
            firstSpaceSix();
            translate ([translateX, doubleTranslateSecondY]) blank();
        }
    }
}
else{
if (number_for_first_domino_space=="seven")
{
    if (number_for_second_domino_space=="one")
    {
        difference()
        {
            firstSpaceSeven();
            translate ([translateX, singleTranslateSecondY]) one();
        }
    }
    else
    if (number_for_second_domino_space=="two")
    {
        difference()
        {
            firstSpaceSeven();
            translate ([translateX, singleTranslateSecondY]) two();
        }
    }
    else
    if (number_for_second_domino_space=="three")
    {
        difference()
        {
            firstSpaceSeven();
            translate ([translateX, singleTranslateSecondY]) three();
        }
    }
    else
    if (number_for_second_domino_space=="four")
    {
        difference()
        {
            firstSpaceSeven();
            translate ([translateX, singleTranslateSecondY]) four();
        }
    }
    else
    if (number_for_second_domino_space=="five")
    {
        difference()
        {
            firstSpaceSeven();
            translate ([translateX, singleTranslateSecondY]) five();
        }
    }
    else
    if (number_for_second_domino_space=="six")
    {
        difference()
        {
            firstSpaceSeven();
            translate ([translateX, singleTranslateSecondY]) six();
        }
    }
    else
    if (number_for_second_domino_space=="seven")
    {
        difference()
        {
            firstSpaceSeven();
            translate ([translateX, singleTranslateSecondY]) seven();
        }
    }
    else
    if (number_for_second_domino_space=="eight")
    {
        difference()
        {
            firstSpaceSeven();
            translate ([translateX, singleTranslateSecondY]) eight();
        }
    }
    else
    if (number_for_second_domino_space=="nine")
    {
        difference()
        {
            firstSpaceSeven();
            translate ([translateX, singleTranslateSecondY]) nine();
        }
    }
    else
    if (number_for_second_domino_space=="ten")
    {
        difference()
        {
            firstSpaceSeven();
            translate ([translateX, doubleTranslateSecondY]) ten();
        }
    }
    else
    if (number_for_second_domino_space=="eleven")
    {
        difference()
        {
            firstSpaceSeven();
            translate ([translateX, elevenTranslateY]) eleven();
        }
    }
    else
    if (number_for_second_domino_space=="twelve")
    {
        difference()
        {
            firstSpaceSeven();
            translate ([translateX, doubleTranslateSecondY]) twelve();
        }
    }
    else
    if (number_for_second_domino_space=="blank")
    {
        difference()
        {
            firstSpaceSeven();
            translate ([translateX, doubleTranslateSecondY]) blank();
        }
    }
}
else{
if (number_for_first_domino_space=="eight")
{
    if (number_for_second_domino_space=="one")
    {
        difference()
        {
            firstSpaceEight();
            translate ([translateX, singleTranslateSecondY]) one();
        }
    }
    else
    if (number_for_second_domino_space=="two")
    {
        difference()
        {
            firstSpaceEight();
            translate ([translateX, singleTranslateSecondY]) two();
        }
    }
    else
    if (number_for_second_domino_space=="three")
    {
        difference()
        {
            firstSpaceEight();
            translate ([translateX, singleTranslateSecondY]) three();
        }
    }
    else
    if (number_for_second_domino_space=="four")
    {
        difference()
        {
            firstSpaceEight();
            translate ([translateX, singleTranslateSecondY]) four();
        }
    }
    else
    if (number_for_second_domino_space=="five")
    {
        difference()
        {
            firstSpaceEight();
            translate ([translateX, singleTranslateSecondY]) five();
        }
    }
    else
    if (number_for_second_domino_space=="six")
    {
        difference()
        {
            firstSpaceEight();
            translate ([translateX, singleTranslateSecondY]) six();
        }
    }
    else
    if (number_for_second_domino_space=="seven")
    {
        difference()
        {
            firstSpaceEight();
            translate ([translateX, singleTranslateSecondY]) seven();
        }
    }
    else
    if (number_for_second_domino_space=="eight")
    {
        difference()
        {
            firstSpaceEight();
            translate ([translateX, singleTranslateSecondY]) eight();
        }
    }
    else
    if (number_for_second_domino_space=="nine")
    {
        difference()
        {
            firstSpaceEight();
            translate ([translateX, singleTranslateSecondY]) nine();
        }
    }
    else
    if (number_for_second_domino_space=="ten")
    {
        difference()
        {
            firstSpaceEight();
            translate ([translateX, doubleTranslateSecondY]) ten();
        }
    }
    else
    if (number_for_second_domino_space=="eleven")
    {
        difference()
        {
            firstSpaceEight();
            translate ([translateX, elevenTranslateY]) eleven();
        }
    }
    else
    if (number_for_second_domino_space=="twelve")
    {
        difference()
        {
            firstSpaceEight();
            translate ([translateX, doubleTranslateSecondY]) twelve();
        }
    }
    else
    if (number_for_second_domino_space=="blank")
    {
        difference()
        {
            firstSpaceEight();
            translate ([translateX, doubleTranslateSecondY]) blank();
        }
    }
}
else{
if (number_for_first_domino_space=="nine")
{
    if (number_for_second_domino_space=="one")
    {
        difference()
        {
            firstSpaceNine();
            translate ([translateX, singleTranslateSecondY]) one();
        }
    }
    else
    if (number_for_second_domino_space=="two")
    {
        difference()
        {
            firstSpaceNine();
            translate ([translateX, singleTranslateSecondY]) two();
        }
    }
    else
    if (number_for_second_domino_space=="three")
    {
        difference()
        {
            firstSpaceNine();
            translate ([translateX, singleTranslateSecondY]) three();
        }
    }
    else
    if (number_for_second_domino_space=="four")
    {
        difference()
        {
            firstSpaceNine();
            translate ([translateX, singleTranslateSecondY]) four();
        }
    }
    else
    if (number_for_second_domino_space=="five")
    {
        difference()
        {
            firstSpaceNine();
            translate ([translateX, singleTranslateSecondY]) five();
        }
    }
    else
    if (number_for_second_domino_space=="six")
    {
        difference()
        {
            firstSpaceNine();
            translate ([translateX, singleTranslateSecondY]) six();
        }
    }
    else
    if (number_for_second_domino_space=="seven")
    {
        difference()
        {
            firstSpaceNine();
            translate ([translateX, singleTranslateSecondY]) seven();
        }
    }
    else
    if (number_for_second_domino_space=="eight")
    {
        difference()
        {
            firstSpaceNine();
            translate ([translateX, singleTranslateSecondY]) eight();
        }
    }
    else
    if (number_for_second_domino_space=="nine")
    {
        difference()
        {
            firstSpaceNine();
            translate ([translateX, singleTranslateSecondY]) nine();
        }
    }
    else
    if (number_for_second_domino_space=="ten")
    {
        difference()
        {
            firstSpaceNine();
            translate ([translateX, doubleTranslateSecondY]) ten();
        }
    }
    else
    if (number_for_second_domino_space=="eleven")
    {
        difference()
        {
            firstSpaceNine();
            translate ([translateX, elevenTranslateY]) eleven();
        }
    }
    else
    if (number_for_second_domino_space=="twelve")
    {
        difference()
        {
            firstSpaceNine();
            translate ([translateX, doubleTranslateSecondY]) twelve();
        }
    }
    else
    if (number_for_second_domino_space=="blank")
    {
        difference()
        {
            firstSpaceNine();
            translate ([translateX, singleTranslateSecondY]) blank();
        }
    }
}
else{
if (number_for_first_domino_space=="ten")
{
    if (number_for_second_domino_space=="one")
    {
        difference()
        {
            firstSpaceTen();
            translate ([translateX, singleTranslateSecondY]) one();
        }
    }
    else
    if (number_for_second_domino_space=="two")
    {
        difference()
        {
            firstSpaceTen();
            translate ([translateX, singleTranslateSecondY]) two();
        }
    }
    else
    if (number_for_second_domino_space=="three")
    {
        difference()
        {
            firstSpaceTen();
            translate ([translateX, singleTranslateSecondY]) three();
        }
    }
    else
    if (number_for_second_domino_space=="four")
    {
        difference()
        {
            firstSpaceTen();
            translate ([translateX, singleTranslateSecondY]) four();
        }
    }
    else
    if (number_for_second_domino_space=="five")
    {
        difference()
        {
            firstSpaceTen();
            translate ([translateX, singleTranslateSecondY]) five();
        }
    }
    else
    if (number_for_second_domino_space=="six")
    {
        difference()
        {
            firstSpaceTen();
            translate ([translateX, singleTranslateSecondY]) six();
        }
    }
    else
    if (number_for_second_domino_space=="seven")
    {
        difference()
        {
            firstSpaceTen();
            translate ([translateX, singleTranslateSecondY]) seven();
        }
    }
    else
    if (number_for_second_domino_space=="eight")
    {
        difference()
        {
            firstSpaceTen();
            translate ([translateX, singleTranslateSecondY]) eight();
        }
    }
    else
    if (number_for_second_domino_space=="nine")
    {
        difference()
        {
            firstSpaceTen();
            translate ([translateX, singleTranslateSecondY]) nine();
        }
    }
    else
    if (number_for_second_domino_space=="ten")
    {
        difference()
        {
            firstSpaceTen();
            translate ([translateX, doubleTranslateSecondY]) ten();
        }
    }
    else
    if (number_for_second_domino_space=="eleven")
    {
        difference()
        {
            firstSpaceTen();
            translate ([translateX, elevenTranslateY]) eleven();
        }
    }
    else
    if (number_for_second_domino_space=="twelve")
    {
        difference()
        {
            firstSpaceTen();
            translate ([translateX, doubleTranslateSecondY]) twelve();
        }
    }
    else
    if (number_for_second_domino_space=="blank")
    {
        difference()
        {
            firstSpaceTen();
            translate ([translateX, doubleTranslateSecondY]) blank();
        }
    }
}
else{
if (number_for_first_domino_space=="eleven")
{
    if (number_for_second_domino_space=="one")
    {
        difference()
        {
            firstSpaceEleven();
            translate ([translateX, singleTranslateSecondY]) one();
        }
    }
    else
    if (number_for_second_domino_space=="two")
    {
        difference()
        {
            firstSpaceEleven();
            translate ([translateX, singleTranslateSecondY]) two();
        }
    }
    else
    if (number_for_second_domino_space=="three")
    {
        difference()
        {
            firstSpaceEleven();
            translate ([translateX, singleTranslateSecondY]) three();
        }
    }
    else
    if (number_for_second_domino_space=="four")
    {
        difference()
        {
            firstSpaceEleven();
            translate ([translateX, singleTranslateSecondY]) four();
        }
    }
    else
    if (number_for_second_domino_space=="five")
    {
        difference()
        {
            firstSpaceEleven();
            translate ([translateX, singleTranslateSecondY]) five();
        }
    }
    else
    if (number_for_second_domino_space=="six")
    {
        difference()
        {
            firstSpaceEleven();
            translate ([translateX, singleTranslateSecondY]) six();
        }
    }
    else
    if (number_for_second_domino_space=="seven")
    {
        difference()
        {
            firstSpaceEleven();
            translate ([translateX, singleTranslateSecondY]) seven();
        }
    }
    else
    if (number_for_second_domino_space=="eight")
    {
        difference()
        {
            firstSpaceEleven();
            translate ([translateX, singleTranslateSecondY]) eight();
        }
    }
    else
    if (number_for_second_domino_space=="nine")
    {
        difference()
        {
            firstSpaceEleven();
            translate ([translateX, singleTranslateSecondY]) nine();
        }
    }
    else
    if (number_for_second_domino_space=="ten")
    {
        difference()
        {
            firstSpaceEleven();
            translate ([translateX, doubleTranslateSecondY]) ten();
        }
    }
    else
    if (number_for_second_domino_space=="eleven")
    {
        difference()
        {
            firstSpaceEleven();
            translate ([translateX, elevenTranslateY]) eleven();
        }
    }
    else
    if (number_for_second_domino_space=="twelve")
    {
        difference()
        {
            firstSpaceEleven();
            translate ([translateX, doubleTranslateSecondY]) twelve();
        }
    }
    else
    if (number_for_second_domino_space=="blank")
    {
        difference()
        {
            firstSpaceEleven();
            translate ([translateX, doubleTranslateSecondY]) blank();
        }
    }
}
else{
if (number_for_first_domino_space=="twelve")
{
    if (number_for_second_domino_space=="one")
    {
        difference()
        {
            firstSpaceTwelve();
            translate ([translateX, singleTranslateSecondY]) one();
        }
    }
    else
    if (number_for_second_domino_space=="two")
    {
        difference()
        {
            firstSpaceTwelve();
            translate ([translateX, singleTranslateSecondY]) two();
        }
    }
    else
    if (number_for_second_domino_space=="three")
    {
        difference()
        {
            firstSpaceTwelve();
            translate ([translateX, singleTranslateSecondY]) three();
        }
    }
    else
    if (number_for_second_domino_space=="four")
    {
        difference()
        {
            firstSpaceTwelve();
            translate ([translateX, singleTranslateSecondY]) four();
        }
    }
    else
    if (number_for_second_domino_space=="five")
    {
        difference()
        {
            firstSpaceTwelve();
            translate ([translateX, singleTranslateSecondY]) five();
        }
    }
    else
    if (number_for_second_domino_space=="six")
    {
        difference()
        {
            firstSpaceTwelve();
            translate ([translateX, singleTranslateSecondY]) six();
        }
    }
    else
    if (number_for_second_domino_space=="seven")
    {
        difference()
        {
            firstSpaceTwelve();
            translate ([translateX, singleTranslateSecondY]) seven();
        }
    }
    else
    if (number_for_second_domino_space=="eight")
    {
        difference()
        {
            firstSpaceTwelve();
            translate ([translateX, singleTranslateSecondY]) eight();
        }
    }
    else
    if (number_for_second_domino_space=="nine")
    {
        difference()
        {
            firstSpaceTwelve();
            translate ([translateX, singleTranslateSecondY]) nine();
        }
    }
    else
    if (number_for_second_domino_space=="ten")
    {
        difference()
        {
            firstSpaceTwelve();
            translate ([translateX, doubleTranslateSecondY]) ten();
        }
    }
    else
    if (number_for_second_domino_space=="eleven")
    {
        difference()
        {
            firstSpaceTwelve();
            translate ([translateX, elevenTranslateY]) eleven();
        }
    }
    else
    if (number_for_second_domino_space=="twelve")
    {
        difference()
        {
            firstSpaceTwelve();
            translate ([translateX, doubleTranslateSecondY]) twelve();
        }
    }
    else
    if (number_for_second_domino_space=="blank")
    {
        difference()
        {
            firstSpaceTwelve();
            translate ([translateX, doubleTranslateSecondY]) blank();
        }
    }
}
else{
if (number_for_first_domino_space=="blank")
{
    if (number_for_second_domino_space=="one")
    {
        difference()
        {
            firstSpaceBlank();
            translate ([translateX, singleTranslateSecondY]) one();
        }
    }
    else
    if (number_for_second_domino_space=="two")
    {
        difference()
        {
            firstSpaceBlank();
            translate ([translateX, singleTranslateSecondY]) two();
        }
    }
    else
    if (number_for_second_domino_space=="three")
    {
        difference()
        {
            firstSpaceBlank();
            translate ([translateX, singleTranslateSecondY]) three();
        }
    }
    else
    if (number_for_second_domino_space=="four")
    {
        difference()
        {
            firstSpaceBlank();
            translate ([translateX, singleTranslateSecondY]) four();
        }
    }
    else
    if (number_for_second_domino_space=="five")
    {
        difference()
        {
            firstSpaceBlank();
            translate ([translateX, singleTranslateSecondY]) five();
        }
    }
    else
    if (number_for_second_domino_space=="six")
    {
        difference()
        {
            firstSpaceBlank();
            translate ([translateX, singleTranslateSecondY]) six();
        }
    }
    else
    if (number_for_second_domino_space=="seven")
    {
        difference()
        {
            firstSpaceBlank();
            translate ([translateX, singleTranslateSecondY]) seven();
        }
    }
    else
    if (number_for_second_domino_space=="eight")
    {
        difference()
        {
            firstSpaceBlank();
            translate ([translateX, singleTranslateSecondY]) eight();
        }
    }
    else
    if (number_for_second_domino_space=="nine")
    {
        difference()
        {
            firstSpaceBlank();
            translate ([translateX, singleTranslateSecondY]) nine();
        }
    }
    else
    if (number_for_second_domino_space=="ten")
    {
        difference()
        {
            firstSpaceBlank();
            translate ([translateX, doubleTranslateSecondY]) ten();
        }
    }
    else
    if (number_for_second_domino_space=="eleven")
    {
        difference()
        {
            firstSpaceBlank();
            translate ([translateX, elevenTranslateY]) eleven();
        }
    }
    else
    if (number_for_second_domino_space=="twelve")
    {
        difference()
        {
            firstSpaceBlank();
            translate ([translateX, doubleTranslateSecondY]) twelve();
        }
    }
    else
    if (number_for_second_domino_space=="blank")
    {
        difference()
        {
            firstSpaceBlank();
            translate ([translateX, doubleTranslateSecondY]) blank();
        }
    }
}
}}}}}}}}}}}}
